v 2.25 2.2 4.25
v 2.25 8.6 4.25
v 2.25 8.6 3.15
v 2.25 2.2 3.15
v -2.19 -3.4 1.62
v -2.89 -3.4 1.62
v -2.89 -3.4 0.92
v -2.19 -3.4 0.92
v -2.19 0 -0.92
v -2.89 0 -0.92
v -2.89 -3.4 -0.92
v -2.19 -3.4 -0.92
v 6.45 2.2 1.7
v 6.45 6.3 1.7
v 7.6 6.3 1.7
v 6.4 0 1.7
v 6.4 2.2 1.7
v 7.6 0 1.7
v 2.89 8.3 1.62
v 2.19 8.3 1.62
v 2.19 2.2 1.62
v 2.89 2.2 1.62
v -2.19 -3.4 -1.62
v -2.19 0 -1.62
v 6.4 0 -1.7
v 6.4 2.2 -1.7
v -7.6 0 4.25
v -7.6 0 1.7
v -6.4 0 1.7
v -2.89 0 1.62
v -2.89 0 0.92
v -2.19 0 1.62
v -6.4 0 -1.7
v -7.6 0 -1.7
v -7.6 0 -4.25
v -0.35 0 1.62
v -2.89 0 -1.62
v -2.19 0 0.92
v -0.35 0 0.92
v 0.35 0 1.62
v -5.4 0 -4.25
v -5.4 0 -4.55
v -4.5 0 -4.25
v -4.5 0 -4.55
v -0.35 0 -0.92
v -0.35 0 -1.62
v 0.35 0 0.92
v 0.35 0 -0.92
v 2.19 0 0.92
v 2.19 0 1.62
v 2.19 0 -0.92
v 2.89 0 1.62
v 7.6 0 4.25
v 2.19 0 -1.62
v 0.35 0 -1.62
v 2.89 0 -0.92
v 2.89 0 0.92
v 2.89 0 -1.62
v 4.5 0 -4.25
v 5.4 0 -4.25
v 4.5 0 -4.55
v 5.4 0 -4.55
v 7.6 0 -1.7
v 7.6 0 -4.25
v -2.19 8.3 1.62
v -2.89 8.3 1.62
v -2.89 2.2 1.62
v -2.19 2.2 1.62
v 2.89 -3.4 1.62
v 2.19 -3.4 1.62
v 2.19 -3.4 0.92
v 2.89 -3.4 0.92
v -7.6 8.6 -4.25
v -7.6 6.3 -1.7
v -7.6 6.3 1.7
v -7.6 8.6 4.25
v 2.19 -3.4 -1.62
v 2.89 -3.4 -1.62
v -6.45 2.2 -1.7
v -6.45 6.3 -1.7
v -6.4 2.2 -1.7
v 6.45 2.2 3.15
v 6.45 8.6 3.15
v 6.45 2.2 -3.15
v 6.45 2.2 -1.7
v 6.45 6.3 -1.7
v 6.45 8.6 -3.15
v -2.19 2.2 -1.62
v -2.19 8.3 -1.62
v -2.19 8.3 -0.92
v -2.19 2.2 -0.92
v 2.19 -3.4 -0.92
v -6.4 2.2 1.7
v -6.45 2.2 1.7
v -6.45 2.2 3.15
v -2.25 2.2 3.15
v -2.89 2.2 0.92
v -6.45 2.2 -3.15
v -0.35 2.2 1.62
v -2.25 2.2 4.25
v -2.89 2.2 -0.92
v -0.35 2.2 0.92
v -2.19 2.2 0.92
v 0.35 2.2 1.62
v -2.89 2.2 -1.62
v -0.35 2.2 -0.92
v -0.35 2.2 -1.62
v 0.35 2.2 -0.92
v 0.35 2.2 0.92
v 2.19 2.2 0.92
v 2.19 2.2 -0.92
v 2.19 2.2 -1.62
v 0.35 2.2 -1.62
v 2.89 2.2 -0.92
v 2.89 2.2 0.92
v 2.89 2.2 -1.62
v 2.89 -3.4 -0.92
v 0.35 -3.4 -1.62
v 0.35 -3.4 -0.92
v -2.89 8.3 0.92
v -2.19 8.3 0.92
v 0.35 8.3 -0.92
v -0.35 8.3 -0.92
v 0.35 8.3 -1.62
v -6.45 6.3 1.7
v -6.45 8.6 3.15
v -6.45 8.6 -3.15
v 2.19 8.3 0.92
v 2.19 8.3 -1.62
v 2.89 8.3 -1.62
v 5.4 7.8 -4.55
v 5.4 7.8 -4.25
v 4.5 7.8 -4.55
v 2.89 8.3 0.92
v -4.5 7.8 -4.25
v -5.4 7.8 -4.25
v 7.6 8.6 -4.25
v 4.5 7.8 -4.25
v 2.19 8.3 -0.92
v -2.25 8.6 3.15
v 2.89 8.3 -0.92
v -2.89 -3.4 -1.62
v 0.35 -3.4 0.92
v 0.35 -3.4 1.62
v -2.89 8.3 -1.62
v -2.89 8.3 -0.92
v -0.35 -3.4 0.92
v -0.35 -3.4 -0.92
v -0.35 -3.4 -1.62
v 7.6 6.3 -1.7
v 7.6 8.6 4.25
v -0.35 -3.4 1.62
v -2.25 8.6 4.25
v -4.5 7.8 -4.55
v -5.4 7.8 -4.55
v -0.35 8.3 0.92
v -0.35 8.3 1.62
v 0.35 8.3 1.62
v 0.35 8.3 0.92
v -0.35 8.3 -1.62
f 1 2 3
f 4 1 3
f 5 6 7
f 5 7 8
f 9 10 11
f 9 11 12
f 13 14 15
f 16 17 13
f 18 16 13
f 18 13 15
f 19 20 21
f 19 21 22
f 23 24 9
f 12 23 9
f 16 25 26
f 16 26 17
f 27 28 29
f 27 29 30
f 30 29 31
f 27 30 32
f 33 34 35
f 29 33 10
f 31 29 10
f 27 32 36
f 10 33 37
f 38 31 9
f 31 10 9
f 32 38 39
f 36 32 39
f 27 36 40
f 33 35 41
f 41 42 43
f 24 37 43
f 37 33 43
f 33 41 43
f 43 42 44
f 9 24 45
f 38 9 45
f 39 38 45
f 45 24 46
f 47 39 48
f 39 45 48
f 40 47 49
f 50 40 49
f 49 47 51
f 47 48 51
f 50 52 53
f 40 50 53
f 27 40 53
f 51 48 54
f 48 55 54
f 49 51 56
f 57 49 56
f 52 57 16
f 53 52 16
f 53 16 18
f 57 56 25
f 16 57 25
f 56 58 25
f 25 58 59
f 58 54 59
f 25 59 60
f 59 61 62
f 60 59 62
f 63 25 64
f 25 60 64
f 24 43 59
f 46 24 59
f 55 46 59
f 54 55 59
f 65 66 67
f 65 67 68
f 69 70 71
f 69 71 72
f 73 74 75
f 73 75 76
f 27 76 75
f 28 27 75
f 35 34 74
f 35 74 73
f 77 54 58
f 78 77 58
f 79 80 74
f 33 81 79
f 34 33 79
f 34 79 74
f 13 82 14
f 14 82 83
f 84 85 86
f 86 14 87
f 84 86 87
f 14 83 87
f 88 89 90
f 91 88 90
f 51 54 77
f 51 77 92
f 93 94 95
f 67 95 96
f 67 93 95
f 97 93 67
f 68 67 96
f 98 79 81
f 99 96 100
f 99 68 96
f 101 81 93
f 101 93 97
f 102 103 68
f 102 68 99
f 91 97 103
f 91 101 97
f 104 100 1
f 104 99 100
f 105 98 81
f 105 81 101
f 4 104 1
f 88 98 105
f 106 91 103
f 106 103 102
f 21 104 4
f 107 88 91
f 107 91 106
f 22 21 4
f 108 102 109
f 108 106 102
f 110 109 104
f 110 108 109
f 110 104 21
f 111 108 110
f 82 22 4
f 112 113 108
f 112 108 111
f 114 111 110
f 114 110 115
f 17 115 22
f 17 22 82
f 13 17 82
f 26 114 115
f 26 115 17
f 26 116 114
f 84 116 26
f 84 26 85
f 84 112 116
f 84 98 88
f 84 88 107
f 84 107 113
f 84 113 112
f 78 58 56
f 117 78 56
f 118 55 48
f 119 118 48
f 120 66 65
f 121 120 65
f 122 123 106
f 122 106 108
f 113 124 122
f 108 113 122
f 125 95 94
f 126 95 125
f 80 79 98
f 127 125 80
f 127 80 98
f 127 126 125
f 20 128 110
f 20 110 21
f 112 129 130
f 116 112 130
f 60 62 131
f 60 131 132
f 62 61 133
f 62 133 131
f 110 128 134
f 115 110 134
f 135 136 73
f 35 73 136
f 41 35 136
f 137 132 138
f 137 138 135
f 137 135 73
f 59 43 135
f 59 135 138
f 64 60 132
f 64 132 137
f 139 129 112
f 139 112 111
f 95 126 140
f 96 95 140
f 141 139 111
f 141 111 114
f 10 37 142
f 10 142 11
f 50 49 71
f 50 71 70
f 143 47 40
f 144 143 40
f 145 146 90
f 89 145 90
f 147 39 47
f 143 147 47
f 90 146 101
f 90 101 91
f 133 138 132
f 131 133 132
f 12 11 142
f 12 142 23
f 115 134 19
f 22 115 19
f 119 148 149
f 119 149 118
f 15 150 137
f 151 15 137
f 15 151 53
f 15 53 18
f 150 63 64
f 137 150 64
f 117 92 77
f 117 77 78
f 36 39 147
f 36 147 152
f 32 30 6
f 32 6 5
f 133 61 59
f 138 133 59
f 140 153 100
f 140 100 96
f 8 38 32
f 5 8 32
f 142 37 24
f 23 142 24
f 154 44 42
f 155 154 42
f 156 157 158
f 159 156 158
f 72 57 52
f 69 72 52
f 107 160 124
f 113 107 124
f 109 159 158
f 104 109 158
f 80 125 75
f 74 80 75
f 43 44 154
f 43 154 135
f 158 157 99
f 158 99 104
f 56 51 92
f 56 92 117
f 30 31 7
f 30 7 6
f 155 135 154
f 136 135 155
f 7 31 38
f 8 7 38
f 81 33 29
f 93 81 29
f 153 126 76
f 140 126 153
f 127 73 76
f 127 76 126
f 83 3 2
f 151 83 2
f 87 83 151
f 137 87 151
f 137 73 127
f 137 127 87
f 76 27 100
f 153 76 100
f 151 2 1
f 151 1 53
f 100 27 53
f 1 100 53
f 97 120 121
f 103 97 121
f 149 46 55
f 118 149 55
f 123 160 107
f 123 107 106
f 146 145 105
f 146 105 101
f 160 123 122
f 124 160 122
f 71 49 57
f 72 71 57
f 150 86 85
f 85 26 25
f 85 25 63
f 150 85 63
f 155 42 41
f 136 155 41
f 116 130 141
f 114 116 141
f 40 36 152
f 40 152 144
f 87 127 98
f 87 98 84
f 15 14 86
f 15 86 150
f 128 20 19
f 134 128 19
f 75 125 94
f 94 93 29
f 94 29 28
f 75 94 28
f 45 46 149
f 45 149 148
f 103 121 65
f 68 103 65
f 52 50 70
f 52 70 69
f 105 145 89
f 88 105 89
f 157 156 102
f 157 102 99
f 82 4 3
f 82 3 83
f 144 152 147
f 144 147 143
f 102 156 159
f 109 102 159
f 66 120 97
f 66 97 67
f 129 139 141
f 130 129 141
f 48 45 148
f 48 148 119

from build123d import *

# Parameters (mm, degrees)
SKETCH1_W            = 15.2
SKETCH1_H            = 8.5
BOSS_EXTRUDE1_DEPTH  = 8.6
SKETCH2_W            = 12.9
SKETCH2_H            = 6.3
CUT_EXTRUDE1_DEPTH   = 6.4
SKETCH3_W            = 4.5
SKETCH3_H            = 1.1
CUT_EXTRUDE2_DEPTH   = 6.4
SKETCH4_W            = 1.2
SKETCH4_H            = 3.4
CUT_EXTRUDE3_DEPTH   = 6.3
SKETCH6_W            = 0.9
SKETCH6_H            = 0.3
BOSS_EXTRUDE2_DEPTH  = 7.8
BOSS_EXTRUDE3_START  = -8.3
SKETCH7_W            = 0.7
SKETCH7_H            = 0.7
BOSS_EXTRUDE3_DEPTH  = 11.7
LPATTERN1_COUNT      = 3
LPATTERN1_PITCH      = 2.54
LPATTERN1_COUNT_DIR2 = 2
LPATTERN1_PITCH_DIR2 = 2.54


with BuildPart() as part:
    # Sketch1 → Boss-Extrude1 (new body)
    with BuildSketch(Plane(origin=(0, 0, 0), x_dir=(1, 0, 0), z_dir=(0, 1, 0))):
        Rectangle(SKETCH1_W, SKETCH1_H)
    extrude(amount=BOSS_EXTRUDE1_DEPTH)

    # Sketch2 → Cut-Extrude1 (cut)
    with BuildSketch(Plane(origin=(0, 8.6, 0), x_dir=(1, 0, 0), z_dir=(0, 1, 0))):
        Rectangle(SKETCH2_W, SKETCH2_H)
    extrude(amount=-CUT_EXTRUDE1_DEPTH, mode=Mode.SUBTRACT)

    # Sketch3 → Cut-Extrude2 (cut)
    with BuildSketch(Plane(origin=(0, 8.6, 0), x_dir=(1, 0, 0), z_dir=(0, 1, 0))):
        with Locations((0, -3.7)):
            Rectangle(SKETCH3_W, SKETCH3_H)
    extrude(amount=-CUT_EXTRUDE2_DEPTH, mode=Mode.SUBTRACT)

    # Sketch4 → Cut-Extrude3 (cut)
    with BuildSketch(Plane.XZ):
        with Locations((7, 0)):
            Rectangle(SKETCH4_W, SKETCH4_H)
    cut_extrude3 = extrude(amount=-CUT_EXTRUDE3_DEPTH, mode=Mode.SUBTRACT)

    # Sketch6 → Boss-Extrude2 (add)
    with BuildSketch(Plane.XZ):
        with Locations((4.95, -4.4)):
            Rectangle(SKETCH6_W, SKETCH6_H)
    boss_extrude2 = extrude(amount=-BOSS_EXTRUDE2_DEPTH)

    # Mirror1: Cut-Extrude3, Boss-Extrude2 across plane
    add(cut_extrude3.mirror(Plane(origin=(0, 0, 0), x_dir=(0, 0, 1), z_dir=(1, 0, 0))), mode=Mode.SUBTRACT)
    add(boss_extrude2.mirror(Plane(origin=(0, 0, 0), x_dir=(0, 0, 1), z_dir=(1, 0, 0))))

    # Sketch7 → Boss-Extrude3 (add)
    with BuildSketch(Plane.XZ.offset(BOSS_EXTRUDE3_START)):
        with Locations((-2.54, -1.27)):
            Rectangle(SKETCH7_W, SKETCH7_H)
    boss_extrude3 = extrude(amount=BOSS_EXTRUDE3_DEPTH)

    # LPattern1: Boss-Extrude3 3 × 2
    with Locations(*[(i * LPATTERN1_PITCH, 0, j * LPATTERN1_PITCH_DIR2) for i in range(LPATTERN1_COUNT) for j in range(LPATTERN1_COUNT_DIR2) if (i, j) != (0, 0)]):
        add(boss_extrude3)


solid = part.part
